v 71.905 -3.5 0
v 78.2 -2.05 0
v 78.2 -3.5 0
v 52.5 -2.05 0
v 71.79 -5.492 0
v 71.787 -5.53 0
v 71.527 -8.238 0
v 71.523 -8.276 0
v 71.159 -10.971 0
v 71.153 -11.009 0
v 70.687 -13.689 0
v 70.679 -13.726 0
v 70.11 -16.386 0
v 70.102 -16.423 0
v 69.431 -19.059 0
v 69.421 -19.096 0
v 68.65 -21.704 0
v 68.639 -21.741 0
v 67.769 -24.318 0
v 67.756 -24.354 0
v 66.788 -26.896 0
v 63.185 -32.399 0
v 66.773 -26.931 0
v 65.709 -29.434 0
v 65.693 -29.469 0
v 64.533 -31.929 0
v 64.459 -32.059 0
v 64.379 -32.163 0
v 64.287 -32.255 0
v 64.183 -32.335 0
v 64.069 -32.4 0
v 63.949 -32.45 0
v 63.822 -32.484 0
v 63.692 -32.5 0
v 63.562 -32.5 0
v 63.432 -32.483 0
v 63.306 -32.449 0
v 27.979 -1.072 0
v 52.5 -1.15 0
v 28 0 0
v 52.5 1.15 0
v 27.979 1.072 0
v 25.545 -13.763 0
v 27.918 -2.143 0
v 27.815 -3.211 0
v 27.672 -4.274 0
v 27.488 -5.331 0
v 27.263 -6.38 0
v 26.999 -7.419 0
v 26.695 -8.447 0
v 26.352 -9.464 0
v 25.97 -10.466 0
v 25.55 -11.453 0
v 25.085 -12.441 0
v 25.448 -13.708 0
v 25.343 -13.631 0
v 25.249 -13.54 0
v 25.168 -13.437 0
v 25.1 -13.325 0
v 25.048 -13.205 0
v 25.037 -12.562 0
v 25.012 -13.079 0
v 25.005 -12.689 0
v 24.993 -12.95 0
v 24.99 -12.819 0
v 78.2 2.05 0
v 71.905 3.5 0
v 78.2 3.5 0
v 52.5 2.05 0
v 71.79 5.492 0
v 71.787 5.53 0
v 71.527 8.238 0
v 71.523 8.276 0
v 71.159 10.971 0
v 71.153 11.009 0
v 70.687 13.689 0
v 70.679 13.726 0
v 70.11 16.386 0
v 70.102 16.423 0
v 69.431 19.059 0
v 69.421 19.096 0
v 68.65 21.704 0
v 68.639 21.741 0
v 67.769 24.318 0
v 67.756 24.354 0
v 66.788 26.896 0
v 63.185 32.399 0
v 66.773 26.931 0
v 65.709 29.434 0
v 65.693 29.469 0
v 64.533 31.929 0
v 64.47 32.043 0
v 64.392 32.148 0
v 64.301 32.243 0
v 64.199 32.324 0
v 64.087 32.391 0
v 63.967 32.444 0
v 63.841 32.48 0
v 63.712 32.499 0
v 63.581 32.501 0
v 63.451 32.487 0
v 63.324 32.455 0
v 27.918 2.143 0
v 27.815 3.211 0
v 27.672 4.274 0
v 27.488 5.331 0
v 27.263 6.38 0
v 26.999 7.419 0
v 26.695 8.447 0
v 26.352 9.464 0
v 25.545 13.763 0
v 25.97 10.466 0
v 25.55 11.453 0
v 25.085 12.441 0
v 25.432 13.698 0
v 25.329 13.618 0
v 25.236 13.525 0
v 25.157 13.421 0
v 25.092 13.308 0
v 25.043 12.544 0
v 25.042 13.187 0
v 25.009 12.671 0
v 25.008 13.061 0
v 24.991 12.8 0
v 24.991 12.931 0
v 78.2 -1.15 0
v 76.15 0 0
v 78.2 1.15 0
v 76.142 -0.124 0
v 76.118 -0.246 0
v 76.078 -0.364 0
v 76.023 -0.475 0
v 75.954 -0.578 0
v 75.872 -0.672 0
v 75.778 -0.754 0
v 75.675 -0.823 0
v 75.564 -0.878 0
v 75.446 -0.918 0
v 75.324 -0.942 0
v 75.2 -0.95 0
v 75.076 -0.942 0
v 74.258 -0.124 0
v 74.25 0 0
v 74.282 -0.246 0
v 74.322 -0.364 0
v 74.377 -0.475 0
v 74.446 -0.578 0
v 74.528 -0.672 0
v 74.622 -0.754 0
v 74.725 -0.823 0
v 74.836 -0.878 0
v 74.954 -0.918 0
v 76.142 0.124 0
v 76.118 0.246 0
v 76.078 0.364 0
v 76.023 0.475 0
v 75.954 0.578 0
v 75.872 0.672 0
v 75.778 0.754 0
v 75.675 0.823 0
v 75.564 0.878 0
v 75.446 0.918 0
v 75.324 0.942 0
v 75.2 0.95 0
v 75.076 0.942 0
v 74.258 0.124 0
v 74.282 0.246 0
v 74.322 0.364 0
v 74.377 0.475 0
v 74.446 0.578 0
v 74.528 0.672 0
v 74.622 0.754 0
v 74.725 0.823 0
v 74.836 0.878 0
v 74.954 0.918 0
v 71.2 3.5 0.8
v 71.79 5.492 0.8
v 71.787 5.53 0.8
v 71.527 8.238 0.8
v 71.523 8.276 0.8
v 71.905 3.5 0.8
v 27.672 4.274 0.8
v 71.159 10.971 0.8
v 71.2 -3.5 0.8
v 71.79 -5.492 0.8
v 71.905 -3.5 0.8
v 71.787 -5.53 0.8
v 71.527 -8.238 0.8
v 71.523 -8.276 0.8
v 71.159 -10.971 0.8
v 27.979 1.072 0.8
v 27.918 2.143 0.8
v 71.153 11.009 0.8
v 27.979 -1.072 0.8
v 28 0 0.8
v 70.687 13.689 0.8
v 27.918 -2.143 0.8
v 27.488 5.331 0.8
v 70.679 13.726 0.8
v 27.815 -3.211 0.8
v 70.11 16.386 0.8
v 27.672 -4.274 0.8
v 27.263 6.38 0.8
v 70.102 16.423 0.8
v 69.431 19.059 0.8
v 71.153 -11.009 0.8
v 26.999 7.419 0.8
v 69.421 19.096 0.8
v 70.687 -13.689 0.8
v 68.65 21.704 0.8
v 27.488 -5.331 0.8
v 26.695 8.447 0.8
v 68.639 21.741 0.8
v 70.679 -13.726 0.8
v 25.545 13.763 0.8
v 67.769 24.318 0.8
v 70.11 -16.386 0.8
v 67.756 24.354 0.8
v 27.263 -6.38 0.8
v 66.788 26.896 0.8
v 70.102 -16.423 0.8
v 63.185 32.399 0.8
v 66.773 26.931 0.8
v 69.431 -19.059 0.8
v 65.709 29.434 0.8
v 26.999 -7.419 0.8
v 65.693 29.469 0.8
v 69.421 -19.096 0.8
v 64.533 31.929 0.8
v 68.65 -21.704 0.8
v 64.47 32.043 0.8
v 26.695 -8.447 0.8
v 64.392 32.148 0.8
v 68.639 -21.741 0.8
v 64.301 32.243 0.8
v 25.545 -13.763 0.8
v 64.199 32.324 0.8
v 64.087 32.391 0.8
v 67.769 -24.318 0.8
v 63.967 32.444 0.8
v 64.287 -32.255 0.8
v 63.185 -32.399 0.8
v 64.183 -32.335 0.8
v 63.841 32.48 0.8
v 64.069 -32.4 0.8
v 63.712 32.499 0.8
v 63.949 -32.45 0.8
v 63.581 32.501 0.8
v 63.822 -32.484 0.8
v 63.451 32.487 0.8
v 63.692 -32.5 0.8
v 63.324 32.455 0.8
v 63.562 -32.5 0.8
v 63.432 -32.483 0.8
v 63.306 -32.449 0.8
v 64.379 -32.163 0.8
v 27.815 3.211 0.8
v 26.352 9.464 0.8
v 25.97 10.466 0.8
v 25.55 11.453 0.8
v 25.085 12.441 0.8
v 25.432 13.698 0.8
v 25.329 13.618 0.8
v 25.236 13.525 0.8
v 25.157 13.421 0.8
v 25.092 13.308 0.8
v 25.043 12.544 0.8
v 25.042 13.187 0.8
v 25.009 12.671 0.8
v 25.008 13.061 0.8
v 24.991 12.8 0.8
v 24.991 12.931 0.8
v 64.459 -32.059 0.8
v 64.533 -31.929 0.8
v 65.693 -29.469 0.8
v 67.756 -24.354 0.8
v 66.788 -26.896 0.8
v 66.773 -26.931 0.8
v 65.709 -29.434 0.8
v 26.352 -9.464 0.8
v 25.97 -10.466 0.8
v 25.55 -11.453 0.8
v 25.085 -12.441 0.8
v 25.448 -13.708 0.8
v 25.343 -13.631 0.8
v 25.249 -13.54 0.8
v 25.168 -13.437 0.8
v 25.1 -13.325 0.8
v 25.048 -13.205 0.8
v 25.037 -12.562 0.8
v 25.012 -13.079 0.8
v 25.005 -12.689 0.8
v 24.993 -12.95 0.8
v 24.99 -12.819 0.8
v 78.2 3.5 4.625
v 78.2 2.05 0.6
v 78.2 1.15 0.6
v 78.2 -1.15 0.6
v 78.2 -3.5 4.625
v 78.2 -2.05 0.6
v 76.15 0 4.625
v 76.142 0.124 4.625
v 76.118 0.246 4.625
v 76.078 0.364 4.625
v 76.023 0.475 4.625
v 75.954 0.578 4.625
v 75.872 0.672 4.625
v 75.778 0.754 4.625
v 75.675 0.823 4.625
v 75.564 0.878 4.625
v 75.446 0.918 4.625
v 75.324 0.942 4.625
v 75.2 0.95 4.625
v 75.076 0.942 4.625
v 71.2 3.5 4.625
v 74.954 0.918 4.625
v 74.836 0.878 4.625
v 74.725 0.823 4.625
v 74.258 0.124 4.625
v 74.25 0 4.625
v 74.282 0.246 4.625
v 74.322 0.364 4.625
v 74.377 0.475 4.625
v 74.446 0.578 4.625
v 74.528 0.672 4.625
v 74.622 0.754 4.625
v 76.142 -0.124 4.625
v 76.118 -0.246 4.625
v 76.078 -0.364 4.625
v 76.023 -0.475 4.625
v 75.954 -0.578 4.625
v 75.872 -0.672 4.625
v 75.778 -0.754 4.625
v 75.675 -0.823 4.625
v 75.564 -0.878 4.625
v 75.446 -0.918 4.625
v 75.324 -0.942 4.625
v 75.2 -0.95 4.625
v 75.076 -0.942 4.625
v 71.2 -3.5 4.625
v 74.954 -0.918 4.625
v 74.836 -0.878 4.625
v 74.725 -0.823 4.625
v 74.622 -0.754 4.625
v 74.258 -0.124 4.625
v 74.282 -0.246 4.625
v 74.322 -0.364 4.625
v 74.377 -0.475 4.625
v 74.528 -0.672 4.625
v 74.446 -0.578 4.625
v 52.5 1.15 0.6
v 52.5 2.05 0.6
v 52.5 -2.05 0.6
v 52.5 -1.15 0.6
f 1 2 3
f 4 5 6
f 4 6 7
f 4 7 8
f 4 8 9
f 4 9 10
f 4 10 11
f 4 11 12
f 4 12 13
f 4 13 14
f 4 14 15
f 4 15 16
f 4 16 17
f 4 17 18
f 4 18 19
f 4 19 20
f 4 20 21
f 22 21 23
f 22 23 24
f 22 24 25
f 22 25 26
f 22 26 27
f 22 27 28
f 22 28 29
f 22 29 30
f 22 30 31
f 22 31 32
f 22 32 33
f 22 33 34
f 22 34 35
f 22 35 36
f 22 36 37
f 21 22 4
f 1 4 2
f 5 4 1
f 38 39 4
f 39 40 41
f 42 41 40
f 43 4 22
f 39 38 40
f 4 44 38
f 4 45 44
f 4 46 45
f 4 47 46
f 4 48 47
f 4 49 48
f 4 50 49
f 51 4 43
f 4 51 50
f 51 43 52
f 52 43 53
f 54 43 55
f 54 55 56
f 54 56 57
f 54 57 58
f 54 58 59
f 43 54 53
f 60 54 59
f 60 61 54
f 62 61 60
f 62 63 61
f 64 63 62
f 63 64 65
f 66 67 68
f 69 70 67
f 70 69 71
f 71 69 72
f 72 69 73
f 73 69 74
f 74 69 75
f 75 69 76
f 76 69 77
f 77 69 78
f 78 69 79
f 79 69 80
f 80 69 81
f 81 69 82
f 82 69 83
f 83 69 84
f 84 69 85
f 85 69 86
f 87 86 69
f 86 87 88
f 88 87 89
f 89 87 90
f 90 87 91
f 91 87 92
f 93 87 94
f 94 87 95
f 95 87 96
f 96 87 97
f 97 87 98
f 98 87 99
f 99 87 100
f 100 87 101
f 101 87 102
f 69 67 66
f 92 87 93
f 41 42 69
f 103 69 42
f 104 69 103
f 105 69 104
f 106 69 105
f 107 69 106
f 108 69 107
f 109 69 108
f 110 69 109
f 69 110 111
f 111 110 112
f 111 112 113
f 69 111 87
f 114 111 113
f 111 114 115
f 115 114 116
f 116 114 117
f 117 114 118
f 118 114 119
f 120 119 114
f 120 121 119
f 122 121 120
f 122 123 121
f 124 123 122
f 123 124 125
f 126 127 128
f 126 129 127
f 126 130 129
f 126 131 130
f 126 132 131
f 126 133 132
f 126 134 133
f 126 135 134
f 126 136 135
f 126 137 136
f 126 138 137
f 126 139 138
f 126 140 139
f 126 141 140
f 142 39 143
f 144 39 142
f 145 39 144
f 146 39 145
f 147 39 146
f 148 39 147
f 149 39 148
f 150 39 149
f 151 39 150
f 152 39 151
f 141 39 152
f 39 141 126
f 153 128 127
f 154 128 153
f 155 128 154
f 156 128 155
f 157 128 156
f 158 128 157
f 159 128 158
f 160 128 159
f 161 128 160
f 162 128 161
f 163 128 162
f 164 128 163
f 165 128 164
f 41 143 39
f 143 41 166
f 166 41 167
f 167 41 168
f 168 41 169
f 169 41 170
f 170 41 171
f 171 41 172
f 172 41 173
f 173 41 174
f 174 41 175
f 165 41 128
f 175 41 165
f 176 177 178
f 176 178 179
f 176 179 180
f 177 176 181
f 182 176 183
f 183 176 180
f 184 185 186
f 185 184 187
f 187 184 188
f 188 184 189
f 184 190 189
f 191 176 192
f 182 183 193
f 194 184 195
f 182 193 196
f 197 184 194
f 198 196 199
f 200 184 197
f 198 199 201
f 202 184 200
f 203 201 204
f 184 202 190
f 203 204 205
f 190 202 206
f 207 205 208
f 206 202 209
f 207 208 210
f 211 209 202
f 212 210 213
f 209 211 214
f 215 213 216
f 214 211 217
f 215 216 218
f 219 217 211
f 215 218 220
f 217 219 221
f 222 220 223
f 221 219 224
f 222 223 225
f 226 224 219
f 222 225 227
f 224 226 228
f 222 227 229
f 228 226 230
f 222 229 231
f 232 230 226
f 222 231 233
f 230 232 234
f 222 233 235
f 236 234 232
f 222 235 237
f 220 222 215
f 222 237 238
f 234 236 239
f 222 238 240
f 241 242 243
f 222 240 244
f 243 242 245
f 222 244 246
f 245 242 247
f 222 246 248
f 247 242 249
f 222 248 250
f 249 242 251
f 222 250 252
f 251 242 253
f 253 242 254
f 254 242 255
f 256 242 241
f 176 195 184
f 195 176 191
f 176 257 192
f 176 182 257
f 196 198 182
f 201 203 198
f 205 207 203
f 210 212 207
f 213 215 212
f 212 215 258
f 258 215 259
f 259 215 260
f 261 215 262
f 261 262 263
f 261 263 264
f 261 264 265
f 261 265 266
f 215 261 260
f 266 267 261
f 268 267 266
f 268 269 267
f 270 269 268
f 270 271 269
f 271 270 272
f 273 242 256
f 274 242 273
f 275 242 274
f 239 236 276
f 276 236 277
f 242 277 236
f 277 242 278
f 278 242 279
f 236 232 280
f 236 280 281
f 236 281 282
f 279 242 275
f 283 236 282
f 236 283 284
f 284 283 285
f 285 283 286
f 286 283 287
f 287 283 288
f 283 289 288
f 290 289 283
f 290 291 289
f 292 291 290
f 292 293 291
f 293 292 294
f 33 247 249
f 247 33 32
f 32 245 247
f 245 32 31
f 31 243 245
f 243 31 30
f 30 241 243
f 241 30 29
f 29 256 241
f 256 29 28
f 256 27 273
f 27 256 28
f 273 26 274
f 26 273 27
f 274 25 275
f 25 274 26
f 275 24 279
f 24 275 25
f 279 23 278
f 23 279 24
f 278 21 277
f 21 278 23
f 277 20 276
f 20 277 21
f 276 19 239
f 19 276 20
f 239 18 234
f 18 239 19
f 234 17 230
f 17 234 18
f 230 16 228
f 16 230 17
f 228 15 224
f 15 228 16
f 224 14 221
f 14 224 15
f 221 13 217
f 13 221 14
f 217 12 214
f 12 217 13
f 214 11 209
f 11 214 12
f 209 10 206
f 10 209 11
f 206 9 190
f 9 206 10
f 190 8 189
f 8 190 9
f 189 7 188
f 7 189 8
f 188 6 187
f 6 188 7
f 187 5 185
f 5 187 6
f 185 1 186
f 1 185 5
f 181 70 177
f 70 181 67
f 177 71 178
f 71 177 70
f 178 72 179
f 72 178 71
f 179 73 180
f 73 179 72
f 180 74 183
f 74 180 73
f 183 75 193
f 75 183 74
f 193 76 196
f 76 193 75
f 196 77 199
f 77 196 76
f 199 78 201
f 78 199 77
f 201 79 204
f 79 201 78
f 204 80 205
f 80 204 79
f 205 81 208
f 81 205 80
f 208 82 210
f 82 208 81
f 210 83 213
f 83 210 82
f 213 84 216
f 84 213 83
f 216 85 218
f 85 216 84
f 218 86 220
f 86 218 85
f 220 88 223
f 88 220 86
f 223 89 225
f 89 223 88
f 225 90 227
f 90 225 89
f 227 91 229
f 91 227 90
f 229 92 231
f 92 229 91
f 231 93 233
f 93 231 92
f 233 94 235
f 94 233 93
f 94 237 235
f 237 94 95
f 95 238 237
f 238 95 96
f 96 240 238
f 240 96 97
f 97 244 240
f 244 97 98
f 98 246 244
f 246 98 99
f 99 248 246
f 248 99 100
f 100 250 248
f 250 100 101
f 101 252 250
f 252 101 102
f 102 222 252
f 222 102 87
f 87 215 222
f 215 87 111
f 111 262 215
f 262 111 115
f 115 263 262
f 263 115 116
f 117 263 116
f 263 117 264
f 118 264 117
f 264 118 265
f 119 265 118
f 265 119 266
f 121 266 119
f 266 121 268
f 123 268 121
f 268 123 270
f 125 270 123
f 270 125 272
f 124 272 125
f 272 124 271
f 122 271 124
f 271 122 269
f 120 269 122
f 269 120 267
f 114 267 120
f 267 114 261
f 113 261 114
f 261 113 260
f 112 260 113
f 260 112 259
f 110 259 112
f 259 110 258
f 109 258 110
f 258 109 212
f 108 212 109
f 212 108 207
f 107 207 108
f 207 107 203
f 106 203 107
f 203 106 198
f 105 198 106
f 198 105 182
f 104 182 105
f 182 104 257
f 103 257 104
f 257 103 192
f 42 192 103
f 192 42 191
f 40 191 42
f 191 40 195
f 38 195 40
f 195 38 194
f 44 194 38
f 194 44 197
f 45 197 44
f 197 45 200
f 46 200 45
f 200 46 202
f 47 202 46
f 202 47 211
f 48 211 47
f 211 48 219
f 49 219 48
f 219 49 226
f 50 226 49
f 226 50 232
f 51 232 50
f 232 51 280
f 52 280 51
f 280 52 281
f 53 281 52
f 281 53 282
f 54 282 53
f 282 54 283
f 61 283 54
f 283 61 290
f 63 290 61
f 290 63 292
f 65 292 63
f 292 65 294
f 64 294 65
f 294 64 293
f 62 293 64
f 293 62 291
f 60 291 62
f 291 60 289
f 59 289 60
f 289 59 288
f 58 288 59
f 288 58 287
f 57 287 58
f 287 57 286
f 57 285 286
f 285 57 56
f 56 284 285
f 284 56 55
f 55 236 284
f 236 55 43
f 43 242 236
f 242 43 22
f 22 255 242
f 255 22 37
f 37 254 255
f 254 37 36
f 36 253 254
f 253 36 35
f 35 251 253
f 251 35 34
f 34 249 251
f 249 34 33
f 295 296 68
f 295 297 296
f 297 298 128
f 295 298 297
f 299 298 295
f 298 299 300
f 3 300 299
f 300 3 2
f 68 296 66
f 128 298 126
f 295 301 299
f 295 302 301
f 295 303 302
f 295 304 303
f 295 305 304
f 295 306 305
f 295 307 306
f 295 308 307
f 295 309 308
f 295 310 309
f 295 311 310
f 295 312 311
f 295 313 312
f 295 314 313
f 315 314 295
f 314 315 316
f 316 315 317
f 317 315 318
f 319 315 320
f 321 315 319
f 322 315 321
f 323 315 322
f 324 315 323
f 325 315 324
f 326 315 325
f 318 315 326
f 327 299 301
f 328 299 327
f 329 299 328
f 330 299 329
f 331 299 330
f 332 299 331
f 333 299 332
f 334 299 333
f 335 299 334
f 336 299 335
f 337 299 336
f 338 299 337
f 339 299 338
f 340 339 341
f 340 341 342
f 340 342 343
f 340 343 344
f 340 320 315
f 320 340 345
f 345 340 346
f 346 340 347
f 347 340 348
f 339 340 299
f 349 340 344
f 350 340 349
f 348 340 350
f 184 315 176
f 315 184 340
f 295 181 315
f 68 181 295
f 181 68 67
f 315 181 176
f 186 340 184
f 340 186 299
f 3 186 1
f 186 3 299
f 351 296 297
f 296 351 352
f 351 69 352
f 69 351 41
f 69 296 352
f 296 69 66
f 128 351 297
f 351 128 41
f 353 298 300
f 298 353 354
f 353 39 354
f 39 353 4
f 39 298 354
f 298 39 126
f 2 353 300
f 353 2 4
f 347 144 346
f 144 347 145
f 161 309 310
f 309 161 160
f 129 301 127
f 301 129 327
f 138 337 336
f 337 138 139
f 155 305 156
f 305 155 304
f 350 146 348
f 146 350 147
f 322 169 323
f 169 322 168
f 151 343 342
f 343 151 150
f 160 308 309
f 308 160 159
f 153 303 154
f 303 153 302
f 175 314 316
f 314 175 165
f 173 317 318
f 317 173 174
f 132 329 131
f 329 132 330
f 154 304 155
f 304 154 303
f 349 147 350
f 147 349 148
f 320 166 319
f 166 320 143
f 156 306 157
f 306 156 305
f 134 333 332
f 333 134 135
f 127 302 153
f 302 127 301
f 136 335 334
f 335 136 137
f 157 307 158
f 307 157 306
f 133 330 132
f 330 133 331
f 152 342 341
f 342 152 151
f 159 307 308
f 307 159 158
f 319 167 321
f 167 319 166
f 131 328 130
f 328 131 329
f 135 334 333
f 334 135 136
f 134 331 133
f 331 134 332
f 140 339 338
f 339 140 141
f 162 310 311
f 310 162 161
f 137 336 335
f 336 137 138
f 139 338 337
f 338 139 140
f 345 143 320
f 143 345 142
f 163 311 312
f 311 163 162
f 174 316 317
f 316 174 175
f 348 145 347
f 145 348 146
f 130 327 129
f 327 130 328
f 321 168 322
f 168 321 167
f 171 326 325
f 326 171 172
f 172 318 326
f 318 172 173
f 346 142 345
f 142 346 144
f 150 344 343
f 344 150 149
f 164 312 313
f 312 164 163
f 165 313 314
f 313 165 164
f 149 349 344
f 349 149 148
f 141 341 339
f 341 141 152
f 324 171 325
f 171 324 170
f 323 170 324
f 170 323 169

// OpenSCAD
// file: parameters.scad
// =============================================================================
// Gen-BM — nightly 2026-10-06 (physics_scorer, honest magpylib watts)
// Lowest-gap pancake: Ø20 ring at R52 (Ø5 assists R42/52/62) with low-profile 7.65 mm dense-wound copper and an 18 mm radial build on wide 29–71 mm sector bobbins — the smallest magnet gap of the series (10.25 mm) — on thick 1/4" (6.35 mm) steel so the higher flux per pole stays well clear of saturation.
// Clocking 0 deg (magnets N facing S) + D-flat keyed bore + index notch + flip-symmetric hole map.
// Windable 2-piece bobbin; turns = physics_scorer turns_fit; copper only between flanges.
// Steel back-iron: 2× Ø138 × 6.35 mm (1/4") mild-steel discs (steel_backiron_disc.dxf); magnets sit ON the steel
// (through-pockets) -> score with --back-iron.
// =============================================================================
topology            = "dual_rotor";

// --- Wire / winding (physics_scorer winding-fit) -------------------------------
wire_awg            = 26;
wire_od             = 0.45;     // insulated OD mm (bare 0.405)
fill_realistic      = 0.65;     // insulated-wire area / window (DENSE layered wind with a jig; scorer cap 0.65)
turns               = 562;       // = physics_scorer turns_fit (do NOT raise)
coil_former_type    = "bobbin";
coil_core_inset     = 18.00;     // radial copper build: hub = copper boundary inset by this
wind_build_axial    = 0.0;      // nothing proud of the flanges
wind_build_radial   = 0.0;

// --- Bobbin (base + lid) ---------------------------------------------------------
coil_id_r           = 29.00;    // copper boundary sector
coil_od_r           = 71.00;
span_deg            = 52.68;    // = pitch - 2*asin((wall+0.85)/coil_id_r) -> >=1.2 mm stator web
former_web          = 7.65;     // copper height between flanges (TALL copper: steel keeps Bz up)
flange_t            = 0.80;     // >= 0.8 mm FDM wall rule (tall winds push on the flanges)
wall                = 1.00;     // flange lip beyond copper
former_bare_h       = former_web + 2 * flange_t;
coil_envelope_h     = former_bare_h + 2 * wind_build_axial;
tab_w               = 7.0;
tab_len             = 7.0;
tab_h               = former_bare_h / 2;
pin_d               = 1.9;      // 1.75 mm filament locating pin
coil_mount_r        = coil_od_r + 0.2 + 4.0;
lead_y              = 1.6;
lead_slot_w         = 0.9;
lead_groove_d       = 0.6;

// --- Gap -------------------------------------------------------------------------
run_clear           = 0.50;     // rotor face -> flange
gap_spacer_h        = run_clear + wind_build_axial;
m2m                 = coil_envelope_h + 2 * run_clear;   // rotor face to rotor face (= gap_sleeve length)

// --- Stator ----------------------------------------------------------------------
coil_stations       = 6;
bay_clear           = 0.25;
stator_thick        = former_bare_h;                        // bobbins flush both faces
stator_od           = 160.0;
shaft_clear_stator  = 14.0;     // stator is static; gap sleeve OD 12 spins inside

// --- Rotor(s) --------------------------------------------------------------------
magnet_Br           = 1.43;     // N52
magnet_d_large      = 20.0;
magnet_h_large      = 5.0;      // one O20x5 per pocket
magnet_h_small      = 5.0;      // one O5x5 per pocket
halbach_magnetisation = "diametric"; // O5x5 assist magnets MUST be DIAMETRICALLY magnetised (tangential)
rotor_b_same_axis   = true;     // same-index magnets share one axis: N faces S across the gap
large_pocket_d      = 20.3;
small_pocket_d      = 5.3;
pocket_h            = 5.10;     // THROUGH the carrier: magnet back face sits on the steel disc
large_n             = 8;
R_large             = 52.0;
R_small_inner       = 42.0;
R_small_mid         = 52.0;
R_small_outer       = 62.0;
small_r_list        = [R_small_inner, R_small_mid, R_small_outer];   // O5 pockets between poles
carrier_od          = 138.0;
carrier_thick       = pocket_h;
hub_h               = 13.5;     // > steel_t + insert: radial set-screw clears the steel
hub_od              = 24.0;     // slim hub so the M4 brace rods fit at R~18 inside the coil ring
hub_insert_d        = 4.0;      // M3 heat-set insert, radial, bears on the D-flat
rotor_b_offset_deg  = 0.0;      // CLOCKING: magnets directly opposite
shaft_key           = "dflat";
dflat_depth         = 0.5;      // 8 mm shaft with 0.5 mm flat (7.5 across flat)
index_notch_d       = 3.0;

// --- Steel back-iron (buyable laser-cut) -------------------------------------------
steel_t             = 6.35;      // mild steel thickness (image method ignores it; sized from steel_flux.py so the return path stays well below saturation)
steel_center_hole   = 26.0;     // slips over the rotor hub (OD 24)
steel_od            = carrier_od;   // steel disc OD = rotor carrier OD

// --- Modular MAX interface ----------------------------------------------------------
shaft_bore          = 8.35;
dflat_x             = 4.0 - dflat_depth + (shaft_bore - 8.0) / 2;
bearing_d           = 21.85;
bearing_h           = 7.2;
m3_clear            = 3.5;
bolt_r_inner        = 30.0;     // M3 steel-disc clamp bolts (inside the magnet ring)
bolt_n_inner        = 4;
bolt_inner_angles   = [0, 90, 180, 270];
bolt_r_outer        = 65.0;     // M3 steel-disc clamp bolts (outside the magnet ring)
bolt_outer_angles   = [45, 135, 225, 315];
flange_bolt_r       = 75.0;     // frame rods: OUTSIDE the rotor OD (rotors spin inside them)
flange_bolt_n       = 6;
flange_bolt_offset  = 30.00;    // between coil stations -> never cuts a lead groove/tab
brace_r             = 18.0;
brace_d             = 4.3;      // temporary M4 jack rods (assembly only)
brace_n             = 4;
brace_angles        = [45, 135, 225, 315];          // flip-symmetric

spacer_pad_od       = 14.0;
spacer_pad_id       = m3_clear;
endbell_od          = 160.0;
endbell_thick       = 8.0;
endbell_shaft_clear = 10.0;
collar_h            = 10.0;
standoff_od         = 9.0;
frame_standoff_h    = run_clear + carrier_thick + hub_h + collar_h + 2.0;
sleeve_od           = 12.0;
plate_max_mm        = 410;

$fn = 64;
// main file
// Gen-BM — bobbin LID (top flange + locating tab). Print x6, flange face DOWN on the bed.
// CA-glue onto the hub top BEFORE winding. Tab = lap joint into the stator tab pocket; 1.75 mm filament
// pin through pin hole + stator ledge, trim flush. Lead slots carry both leads flush.
include <parameters.scad>;
$fn = 48;
module sector_2d(r_in, r_out, ang) {
    polygon([
        for (a = [-ang/2 : ang/24 : ang/2]) [r_in*cos(a), r_in*sin(a)],
        for (a = [ang/2 : -ang/24 : -ang/2]) [r_out*cos(a), r_out*sin(a)]
    ]);
}
module footprint_2d() { offset(r=wall) sector_2d(coil_id_r, coil_od_r, span_deg); }
module hub_2d()       { offset(delta=-coil_core_inset) sector_2d(coil_id_r, coil_od_r, span_deg); }

difference() {
    union() {
        linear_extrude(flange_t) footprint_2d();
        translate([coil_od_r + 0.2, -tab_w/2, 0]) cube([tab_len, tab_w, tab_h]);
    }
    translate([coil_mount_r, 0, -0.1]) cylinder(d=pin_d, h=tab_h + 1);
    for (y = [lead_y, -lead_y])
        translate([coil_od_r - coil_core_inset - 0.5, y - lead_slot_w/2, -0.1])
            cube([coil_core_inset + tab_len + 2, lead_slot_w, lead_groove_d + 0.1]);
}
